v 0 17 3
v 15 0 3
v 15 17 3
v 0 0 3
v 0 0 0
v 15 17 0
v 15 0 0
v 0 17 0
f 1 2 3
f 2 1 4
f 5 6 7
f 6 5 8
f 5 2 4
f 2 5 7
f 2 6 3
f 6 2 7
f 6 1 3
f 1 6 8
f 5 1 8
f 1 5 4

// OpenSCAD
// Generated by SolidPython 1.0.1 on 2020-07-29 00:46:55


cube(size = [15, 17, 3]);
/***********************************************
*********      SolidPython code:      **********
************************************************
 
# import packages: SolidPython
from solid import *
from solid.utils import *
from itertools import chain, combinations, permutations


class Resize:

    def __init__(self, scad_file):
        self.scad_file = scad_file
        #self.scad_file = import_scad(scad_file)
        # cone/cylinder param:
        self.r1 = 0
        self.r2 = 0
        self.h = 0
        # rectangular prism param:
        self.w = 0
        self.l = 0
        # ellipse param:
        self.r = 0

    # import OpenScad code (file name corresponds to shape)


    # classify shape + parameters
    def assign(self, param1, param2, param3):
        if self.scad_file == 'cone.scad':
            self.r1 = param1
            self.r2 = param2
            self.h = param3
        elif self.scad_file == 'cylinder.scad':
            self.r1 = param1
            self.r2 = param2
            self.h = param3
        elif self.scad_file == 'rectangularPrism.scad':
            self.h = param1
            self.l = param2
            self.w = param3
        else:
            self.r = param1
            self.h = param2

    # resize parameters
    def iterate(self):
        x = range(3, 20, 2)
        i = 1
        if self.scad_file == 'cone.scad':
            tempList = list(permutations(x, 2))
            for temp in tempList:
                param1 = temp[0]
                param2 = temp[1]
                filepath = 'produced_scad_files/' + 'cone' + str(param1) + '_' + str(param2) + '_' + '.scad'
                scad_render_to_file(cylinder(h=param1, r1=param2, r2=0), filepath)

        elif self.scad_file == 'cylinder.scad':
            tempList = list(permutations(x, 3))
            for temp in tempList:
                param1 = temp[0]
                param2 = temp[1]
                filepath = 'produced_scad_files/' + 'cylinder' + str(param1) + '_' + str(param2) + '_' + '.scad'
                scad_render_to_file(cylinder(h=param1, r1=param2, r2=param2), filepath)

        elif self.scad_file == 'rectangularPrism.scad':
            tempList = list(permutations(x, 3))
            for temp in tempList:
                param1 = temp[0]
                param2 = temp[1]
                param3 = temp[2]
                filepath = 'produced_scad_files/' + 'rectangularPrism' + str(param1) + '_' + str(param2) + '_' + str(
                    param3) + '.scad'
                scad_render_to_file(cube(size=(param1, param2, param3)), filepath)

        elif self.scad_file == 'ellipse.scad':
            tempList = list(permutations(x, 4))
            for temp in tempList:
                param1 = temp[0]
                param2 = temp[1]
                param3 = temp[2]
                param4 = temp[3]
                filepath = 'produced_scad_files/' + 'ellipse' + str(param1) + '_' + str(param2) + '_' + str(param3) + '_' + str(param4) + '.scad'
                scad_render_to_file(scale([param1, param2, param3])(sphere(r=param4)), filepath)

    def render_to_scadfile(self):
        scad_render_to_file(scad, 'example.scad') 
 
************************************************/
